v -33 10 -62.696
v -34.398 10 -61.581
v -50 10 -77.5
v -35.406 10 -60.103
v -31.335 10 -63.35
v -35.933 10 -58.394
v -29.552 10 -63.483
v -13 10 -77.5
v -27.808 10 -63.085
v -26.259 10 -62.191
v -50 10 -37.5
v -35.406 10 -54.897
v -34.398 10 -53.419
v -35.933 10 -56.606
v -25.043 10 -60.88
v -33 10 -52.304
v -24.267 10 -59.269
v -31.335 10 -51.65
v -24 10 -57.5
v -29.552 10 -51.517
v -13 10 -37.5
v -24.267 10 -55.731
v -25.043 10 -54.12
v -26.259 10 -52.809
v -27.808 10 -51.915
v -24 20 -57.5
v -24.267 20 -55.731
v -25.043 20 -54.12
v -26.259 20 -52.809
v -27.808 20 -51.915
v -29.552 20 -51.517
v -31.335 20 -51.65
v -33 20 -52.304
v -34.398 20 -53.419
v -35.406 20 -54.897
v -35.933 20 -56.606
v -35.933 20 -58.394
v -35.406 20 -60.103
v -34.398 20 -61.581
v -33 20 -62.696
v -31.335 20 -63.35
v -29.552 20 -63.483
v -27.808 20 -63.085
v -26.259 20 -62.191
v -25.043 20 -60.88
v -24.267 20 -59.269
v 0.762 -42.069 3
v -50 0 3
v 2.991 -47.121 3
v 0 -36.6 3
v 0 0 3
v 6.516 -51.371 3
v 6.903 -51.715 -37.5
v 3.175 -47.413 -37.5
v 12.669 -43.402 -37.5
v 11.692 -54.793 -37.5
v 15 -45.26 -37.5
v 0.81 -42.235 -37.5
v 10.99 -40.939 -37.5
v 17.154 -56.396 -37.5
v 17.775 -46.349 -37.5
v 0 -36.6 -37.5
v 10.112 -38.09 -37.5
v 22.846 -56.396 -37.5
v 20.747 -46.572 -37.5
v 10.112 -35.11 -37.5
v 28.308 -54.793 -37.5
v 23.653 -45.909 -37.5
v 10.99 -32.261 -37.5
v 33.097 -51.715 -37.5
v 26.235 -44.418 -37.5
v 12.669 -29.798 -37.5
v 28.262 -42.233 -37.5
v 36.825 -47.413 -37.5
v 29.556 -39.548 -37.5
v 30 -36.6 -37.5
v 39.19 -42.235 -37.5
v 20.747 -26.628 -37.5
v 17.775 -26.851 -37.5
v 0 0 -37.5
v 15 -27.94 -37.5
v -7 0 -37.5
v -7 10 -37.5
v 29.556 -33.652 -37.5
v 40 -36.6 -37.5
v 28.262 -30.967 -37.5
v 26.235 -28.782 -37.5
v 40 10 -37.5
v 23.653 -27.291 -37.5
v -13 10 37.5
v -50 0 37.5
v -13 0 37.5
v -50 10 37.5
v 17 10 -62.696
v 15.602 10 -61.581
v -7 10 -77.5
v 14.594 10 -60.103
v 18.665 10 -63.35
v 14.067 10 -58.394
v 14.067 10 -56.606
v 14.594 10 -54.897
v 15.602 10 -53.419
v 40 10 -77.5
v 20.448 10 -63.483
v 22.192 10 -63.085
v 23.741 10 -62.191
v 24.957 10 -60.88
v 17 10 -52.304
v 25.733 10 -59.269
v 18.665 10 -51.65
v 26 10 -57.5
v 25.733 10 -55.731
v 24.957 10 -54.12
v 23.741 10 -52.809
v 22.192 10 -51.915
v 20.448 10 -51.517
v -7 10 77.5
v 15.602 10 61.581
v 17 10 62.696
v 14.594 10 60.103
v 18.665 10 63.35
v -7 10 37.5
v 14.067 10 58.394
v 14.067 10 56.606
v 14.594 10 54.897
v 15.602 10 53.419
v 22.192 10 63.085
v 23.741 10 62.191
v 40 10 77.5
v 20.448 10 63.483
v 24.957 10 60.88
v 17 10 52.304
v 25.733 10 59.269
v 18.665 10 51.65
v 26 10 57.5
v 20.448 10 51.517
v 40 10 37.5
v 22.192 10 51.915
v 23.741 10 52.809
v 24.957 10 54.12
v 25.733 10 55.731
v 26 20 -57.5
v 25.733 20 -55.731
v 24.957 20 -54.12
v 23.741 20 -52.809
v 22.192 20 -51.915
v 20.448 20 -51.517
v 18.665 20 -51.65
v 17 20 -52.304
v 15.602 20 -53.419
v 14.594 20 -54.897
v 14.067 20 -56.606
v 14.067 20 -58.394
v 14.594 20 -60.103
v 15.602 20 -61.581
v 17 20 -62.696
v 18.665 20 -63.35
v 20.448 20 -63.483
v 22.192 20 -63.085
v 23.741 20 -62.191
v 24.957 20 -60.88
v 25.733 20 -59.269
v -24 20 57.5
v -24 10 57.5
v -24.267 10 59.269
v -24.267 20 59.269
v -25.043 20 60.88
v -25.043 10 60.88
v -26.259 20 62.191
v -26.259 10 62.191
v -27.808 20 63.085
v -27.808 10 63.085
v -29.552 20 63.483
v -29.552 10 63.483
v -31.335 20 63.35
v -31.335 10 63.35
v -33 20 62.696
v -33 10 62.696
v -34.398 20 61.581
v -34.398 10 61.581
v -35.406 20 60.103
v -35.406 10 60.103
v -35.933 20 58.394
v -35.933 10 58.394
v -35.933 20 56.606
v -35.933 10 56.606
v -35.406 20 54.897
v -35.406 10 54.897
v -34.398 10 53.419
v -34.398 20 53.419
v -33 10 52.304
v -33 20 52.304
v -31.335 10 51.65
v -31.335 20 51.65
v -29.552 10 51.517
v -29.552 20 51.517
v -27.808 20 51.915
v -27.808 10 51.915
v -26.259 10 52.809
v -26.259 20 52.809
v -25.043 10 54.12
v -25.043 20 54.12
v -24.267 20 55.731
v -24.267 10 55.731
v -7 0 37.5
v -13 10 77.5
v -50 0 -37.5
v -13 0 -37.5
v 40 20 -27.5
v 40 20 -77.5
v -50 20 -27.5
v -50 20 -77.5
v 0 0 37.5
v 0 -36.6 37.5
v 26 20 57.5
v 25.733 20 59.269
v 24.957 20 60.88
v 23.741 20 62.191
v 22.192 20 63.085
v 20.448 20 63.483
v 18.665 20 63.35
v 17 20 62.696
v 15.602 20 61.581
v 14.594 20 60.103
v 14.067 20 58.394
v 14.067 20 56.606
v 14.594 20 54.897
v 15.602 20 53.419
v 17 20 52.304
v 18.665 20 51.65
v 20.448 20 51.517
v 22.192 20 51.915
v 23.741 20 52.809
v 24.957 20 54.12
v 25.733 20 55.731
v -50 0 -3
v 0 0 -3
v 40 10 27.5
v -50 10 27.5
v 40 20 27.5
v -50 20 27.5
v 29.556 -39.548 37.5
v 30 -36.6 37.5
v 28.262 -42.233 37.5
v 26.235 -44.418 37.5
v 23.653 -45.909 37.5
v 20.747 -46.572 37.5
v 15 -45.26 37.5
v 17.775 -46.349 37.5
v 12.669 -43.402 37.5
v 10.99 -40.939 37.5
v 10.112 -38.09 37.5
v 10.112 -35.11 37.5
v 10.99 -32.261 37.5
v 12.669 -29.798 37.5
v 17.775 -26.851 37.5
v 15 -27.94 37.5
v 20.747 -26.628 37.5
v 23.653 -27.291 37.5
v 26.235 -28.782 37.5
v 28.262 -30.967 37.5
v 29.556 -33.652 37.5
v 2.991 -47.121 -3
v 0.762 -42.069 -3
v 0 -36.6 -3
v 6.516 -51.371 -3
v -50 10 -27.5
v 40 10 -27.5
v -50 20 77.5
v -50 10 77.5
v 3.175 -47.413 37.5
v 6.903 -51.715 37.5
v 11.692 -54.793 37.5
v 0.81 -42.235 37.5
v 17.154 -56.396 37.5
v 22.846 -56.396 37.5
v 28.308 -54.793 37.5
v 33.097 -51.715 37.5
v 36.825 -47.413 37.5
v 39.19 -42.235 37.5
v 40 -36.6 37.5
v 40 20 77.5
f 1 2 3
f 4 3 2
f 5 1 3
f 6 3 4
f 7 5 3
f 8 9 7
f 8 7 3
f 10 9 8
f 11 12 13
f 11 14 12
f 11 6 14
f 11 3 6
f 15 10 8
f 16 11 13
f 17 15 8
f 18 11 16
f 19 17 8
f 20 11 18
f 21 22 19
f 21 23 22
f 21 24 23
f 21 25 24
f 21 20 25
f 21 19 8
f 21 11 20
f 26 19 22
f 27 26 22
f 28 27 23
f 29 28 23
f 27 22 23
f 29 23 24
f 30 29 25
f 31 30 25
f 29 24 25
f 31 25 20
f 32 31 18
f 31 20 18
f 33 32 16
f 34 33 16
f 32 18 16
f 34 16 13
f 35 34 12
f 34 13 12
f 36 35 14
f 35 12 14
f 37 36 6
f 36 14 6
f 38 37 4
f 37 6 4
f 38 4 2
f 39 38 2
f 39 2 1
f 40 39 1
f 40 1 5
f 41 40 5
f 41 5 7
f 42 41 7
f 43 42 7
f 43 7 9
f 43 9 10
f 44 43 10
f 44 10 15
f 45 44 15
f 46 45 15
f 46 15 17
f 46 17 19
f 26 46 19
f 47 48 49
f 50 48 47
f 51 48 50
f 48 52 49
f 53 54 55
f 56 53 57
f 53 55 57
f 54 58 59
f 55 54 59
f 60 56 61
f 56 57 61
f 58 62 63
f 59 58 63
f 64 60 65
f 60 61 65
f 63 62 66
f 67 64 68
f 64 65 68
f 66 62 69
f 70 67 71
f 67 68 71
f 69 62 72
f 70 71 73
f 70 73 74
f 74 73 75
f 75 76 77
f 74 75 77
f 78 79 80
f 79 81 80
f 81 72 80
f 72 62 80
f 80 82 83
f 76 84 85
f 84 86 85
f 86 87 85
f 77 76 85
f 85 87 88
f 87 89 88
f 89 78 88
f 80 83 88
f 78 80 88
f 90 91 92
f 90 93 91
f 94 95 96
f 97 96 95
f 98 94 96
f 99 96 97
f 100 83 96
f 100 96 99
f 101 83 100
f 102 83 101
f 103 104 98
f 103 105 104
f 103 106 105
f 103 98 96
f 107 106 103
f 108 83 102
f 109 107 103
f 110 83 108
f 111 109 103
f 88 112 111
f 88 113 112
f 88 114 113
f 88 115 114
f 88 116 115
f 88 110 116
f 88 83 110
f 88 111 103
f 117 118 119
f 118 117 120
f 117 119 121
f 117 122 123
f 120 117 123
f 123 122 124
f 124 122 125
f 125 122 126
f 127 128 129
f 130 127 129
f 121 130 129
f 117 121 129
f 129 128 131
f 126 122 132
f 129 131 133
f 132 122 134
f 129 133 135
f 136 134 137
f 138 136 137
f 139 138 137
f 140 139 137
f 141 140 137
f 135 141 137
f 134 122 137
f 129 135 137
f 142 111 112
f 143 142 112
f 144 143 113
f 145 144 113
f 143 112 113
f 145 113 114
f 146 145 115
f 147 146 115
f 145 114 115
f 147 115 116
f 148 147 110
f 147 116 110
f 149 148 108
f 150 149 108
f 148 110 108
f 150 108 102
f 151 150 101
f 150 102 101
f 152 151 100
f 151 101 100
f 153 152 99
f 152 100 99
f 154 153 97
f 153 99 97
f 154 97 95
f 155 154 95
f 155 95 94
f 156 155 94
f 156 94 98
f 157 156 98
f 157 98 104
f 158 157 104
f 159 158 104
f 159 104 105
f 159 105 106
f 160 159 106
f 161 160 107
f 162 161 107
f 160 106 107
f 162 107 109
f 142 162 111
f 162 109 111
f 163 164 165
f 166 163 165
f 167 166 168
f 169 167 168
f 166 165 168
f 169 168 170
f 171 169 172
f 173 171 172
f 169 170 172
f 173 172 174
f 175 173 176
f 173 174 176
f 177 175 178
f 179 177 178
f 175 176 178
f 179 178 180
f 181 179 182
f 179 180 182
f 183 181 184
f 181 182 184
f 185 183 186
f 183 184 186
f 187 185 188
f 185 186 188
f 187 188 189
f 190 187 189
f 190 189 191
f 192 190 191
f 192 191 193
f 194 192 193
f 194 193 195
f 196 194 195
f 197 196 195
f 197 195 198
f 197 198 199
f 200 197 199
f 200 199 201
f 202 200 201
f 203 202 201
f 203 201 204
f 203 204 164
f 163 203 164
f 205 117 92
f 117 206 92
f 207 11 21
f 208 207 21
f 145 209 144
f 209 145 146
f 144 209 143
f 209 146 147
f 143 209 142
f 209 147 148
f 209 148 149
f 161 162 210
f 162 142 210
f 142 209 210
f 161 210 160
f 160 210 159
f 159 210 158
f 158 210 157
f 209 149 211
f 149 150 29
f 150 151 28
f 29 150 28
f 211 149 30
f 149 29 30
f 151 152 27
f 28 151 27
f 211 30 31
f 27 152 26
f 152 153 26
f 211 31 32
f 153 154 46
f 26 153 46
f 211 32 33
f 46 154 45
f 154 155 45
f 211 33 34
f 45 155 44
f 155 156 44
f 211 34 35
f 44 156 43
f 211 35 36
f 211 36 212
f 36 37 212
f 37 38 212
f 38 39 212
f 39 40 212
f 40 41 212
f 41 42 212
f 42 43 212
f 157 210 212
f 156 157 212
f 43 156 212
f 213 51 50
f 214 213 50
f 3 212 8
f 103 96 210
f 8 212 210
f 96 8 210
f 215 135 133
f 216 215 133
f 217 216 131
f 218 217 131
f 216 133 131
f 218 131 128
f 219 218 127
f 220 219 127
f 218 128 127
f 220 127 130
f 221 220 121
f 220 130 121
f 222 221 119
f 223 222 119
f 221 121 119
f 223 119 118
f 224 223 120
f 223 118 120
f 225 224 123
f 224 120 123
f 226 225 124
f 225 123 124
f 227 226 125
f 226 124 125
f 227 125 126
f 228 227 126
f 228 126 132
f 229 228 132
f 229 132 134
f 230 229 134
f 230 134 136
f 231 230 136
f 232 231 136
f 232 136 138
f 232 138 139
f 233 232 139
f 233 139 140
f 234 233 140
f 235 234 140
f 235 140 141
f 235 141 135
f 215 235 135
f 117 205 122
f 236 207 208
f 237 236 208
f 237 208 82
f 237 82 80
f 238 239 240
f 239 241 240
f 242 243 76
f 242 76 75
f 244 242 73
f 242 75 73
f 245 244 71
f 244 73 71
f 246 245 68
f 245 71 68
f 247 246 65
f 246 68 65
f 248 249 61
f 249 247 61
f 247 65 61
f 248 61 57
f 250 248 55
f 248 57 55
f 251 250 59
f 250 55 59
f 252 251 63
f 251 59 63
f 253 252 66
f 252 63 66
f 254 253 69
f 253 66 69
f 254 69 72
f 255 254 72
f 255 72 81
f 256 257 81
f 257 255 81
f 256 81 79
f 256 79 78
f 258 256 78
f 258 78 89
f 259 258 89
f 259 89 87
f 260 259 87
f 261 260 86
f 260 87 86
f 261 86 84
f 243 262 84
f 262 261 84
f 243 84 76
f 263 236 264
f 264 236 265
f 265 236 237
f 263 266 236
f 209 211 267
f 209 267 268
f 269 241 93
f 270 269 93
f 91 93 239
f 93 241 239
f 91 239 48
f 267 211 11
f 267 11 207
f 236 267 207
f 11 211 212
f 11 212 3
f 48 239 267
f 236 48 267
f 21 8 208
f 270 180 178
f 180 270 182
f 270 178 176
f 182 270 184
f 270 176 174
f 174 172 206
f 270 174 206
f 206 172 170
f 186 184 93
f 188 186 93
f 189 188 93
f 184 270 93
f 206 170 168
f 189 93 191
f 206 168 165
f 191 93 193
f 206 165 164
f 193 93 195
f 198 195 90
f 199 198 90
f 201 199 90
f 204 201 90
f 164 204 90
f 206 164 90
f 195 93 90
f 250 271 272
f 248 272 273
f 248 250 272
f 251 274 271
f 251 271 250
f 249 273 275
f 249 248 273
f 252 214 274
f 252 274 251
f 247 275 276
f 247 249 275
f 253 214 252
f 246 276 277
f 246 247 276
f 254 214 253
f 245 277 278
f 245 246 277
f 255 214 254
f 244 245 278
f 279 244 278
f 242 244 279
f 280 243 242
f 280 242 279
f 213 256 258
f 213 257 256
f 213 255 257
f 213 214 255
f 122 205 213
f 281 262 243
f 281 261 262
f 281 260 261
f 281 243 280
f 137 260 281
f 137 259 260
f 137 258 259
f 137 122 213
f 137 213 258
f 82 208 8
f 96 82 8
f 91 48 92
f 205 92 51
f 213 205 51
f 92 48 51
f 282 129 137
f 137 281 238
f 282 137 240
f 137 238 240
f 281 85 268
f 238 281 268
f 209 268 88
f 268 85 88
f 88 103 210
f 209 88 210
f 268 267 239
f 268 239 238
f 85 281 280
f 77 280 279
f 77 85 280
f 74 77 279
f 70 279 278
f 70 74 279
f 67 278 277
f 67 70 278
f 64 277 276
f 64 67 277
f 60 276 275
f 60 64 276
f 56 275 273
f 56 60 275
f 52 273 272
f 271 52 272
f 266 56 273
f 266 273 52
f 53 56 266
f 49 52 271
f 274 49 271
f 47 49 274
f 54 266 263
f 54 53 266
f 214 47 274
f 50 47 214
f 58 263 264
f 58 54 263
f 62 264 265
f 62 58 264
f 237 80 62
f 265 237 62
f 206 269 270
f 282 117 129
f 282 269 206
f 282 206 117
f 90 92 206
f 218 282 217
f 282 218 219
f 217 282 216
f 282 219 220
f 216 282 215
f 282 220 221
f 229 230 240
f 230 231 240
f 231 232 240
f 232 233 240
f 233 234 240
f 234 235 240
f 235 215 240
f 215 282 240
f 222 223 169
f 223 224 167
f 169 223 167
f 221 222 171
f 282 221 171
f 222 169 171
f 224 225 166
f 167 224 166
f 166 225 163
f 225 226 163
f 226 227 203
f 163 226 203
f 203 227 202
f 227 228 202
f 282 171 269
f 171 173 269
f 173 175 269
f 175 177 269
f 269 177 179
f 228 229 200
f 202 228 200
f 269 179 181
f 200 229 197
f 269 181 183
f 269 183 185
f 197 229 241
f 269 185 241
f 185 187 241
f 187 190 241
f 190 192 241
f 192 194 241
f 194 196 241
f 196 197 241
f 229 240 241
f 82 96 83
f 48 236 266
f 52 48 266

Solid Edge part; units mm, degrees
sketch "Sketch1" plane through (0, 0, 0) normal (0, 0, 1) x (1, 0, 0)
  line L0 (-50, 0) -> (0, 0)
  line L1 (0, 0) -> (0, -36.6)
  arc A0 (0, -36.6) -> (40, -36.6) centre (20, -36.6) ccw
  line L2 (-50, 0) -> (6.5476, -51.3997)
extrude "Protrusion1" add sketch "Sketch1" along normal mid plane 6 material side at (-25, -0.05, 0)
sketch "Sketch2" plane through (0, 0, 0) normal (0, 0, 1) x (1, 0, 0)
  line L0 (40, 20) -> (-50, 20)
  line L1 (-50, 20) -> (-50, 0)
  line L2 (-50, 0) -> (0, 0)
  line L3 (0, 0) -> (0, -36.6)
  arc A0 (0, -36.6) -> (40, -36.6) centre (20, -36.6) ccw
  line L4 (40, -36.6) -> (40, 20)
  circle A1 centre (20, -36.6) radius 10
extrude "ExtrudedProtrusion_2" add sketch "Sketch2" along normal mid plane 75
sketch "Sketch3" plane through (0, 0, 0) normal (0, 0, 1) x (1, 0, 0)
  line L0 (-50, 10) -> (40, 10)
  line L1 (40, 10) -> (40, 20)
  line L2 (40, 20) -> (-50, 20)
  line L3 (-50, 20) -> (-50, 10)
extrude "ExtrudedCutout_4" cut sketch "Sketch3" along normal mid plane 55
sketch "Sketch4" plane through (-5, -18.3, 37.5) normal (0, 0, 1) x (0, 1, 0)
  line L0 (38.3, 45) -> (28.3, 45)
  line L1 (28.3, 45) -> (28.3, -45)
  line L2 (28.3, -45) -> (38.3, -45)
  line L3 (38.3, -45) -> (38.3, 45)
extrude "ExtrudedProtrusion_5" add sketch "Sketch4" along normal blind 40
sketch "Sketch5" plane through (40, 20, -37.5) normal (0, 0, -1) x (0, -1, 0)
  line L0 (10, 0) -> (0, 0)
  line L1 (0, 0) -> (0, 90)
  line L2 (0, 90) -> (10, 90)
  line L3 (10, 90) -> (10, 0)
extrude "ExtrudedProtrusion_6" add sketch "Sketch5" along normal blind 40
sketch "Sketch6" plane through (-5, 10, 57.5) normal (0, -1, 0) x (1, 0, 0)
  circle A0 centre (25, 0) radius 6
  circle A1 centre (-25, 0) radius 6
  circle A2 centre (25, -115) radius 6
  circle A3 centre (-25, -115) radius 6
extrude "ExtrudedCutout_5" cut sketch "Sketch6" against normal blind 100
sketch "Sketch7" plane through (-13, 10, 0) normal (-1, 0, 0) x (0, 0, -1)
  line L0 (-77.5, 0) -> (-37.5, 10)
  line L1 (-37.5, 10) -> (-37.5, 0)
  line L2 (-37.5, 0) -> (-77.5, 0)
  line L3 (37.5, 10) -> (77.5, 0)
  line L4 (77.5, 0) -> (37.5, 0)
  line L5 (37.5, 0) -> (37.5, 10)
extrude "ExtrudedProtrusion_7" add sketch "Sketch7" against normal blind 6
